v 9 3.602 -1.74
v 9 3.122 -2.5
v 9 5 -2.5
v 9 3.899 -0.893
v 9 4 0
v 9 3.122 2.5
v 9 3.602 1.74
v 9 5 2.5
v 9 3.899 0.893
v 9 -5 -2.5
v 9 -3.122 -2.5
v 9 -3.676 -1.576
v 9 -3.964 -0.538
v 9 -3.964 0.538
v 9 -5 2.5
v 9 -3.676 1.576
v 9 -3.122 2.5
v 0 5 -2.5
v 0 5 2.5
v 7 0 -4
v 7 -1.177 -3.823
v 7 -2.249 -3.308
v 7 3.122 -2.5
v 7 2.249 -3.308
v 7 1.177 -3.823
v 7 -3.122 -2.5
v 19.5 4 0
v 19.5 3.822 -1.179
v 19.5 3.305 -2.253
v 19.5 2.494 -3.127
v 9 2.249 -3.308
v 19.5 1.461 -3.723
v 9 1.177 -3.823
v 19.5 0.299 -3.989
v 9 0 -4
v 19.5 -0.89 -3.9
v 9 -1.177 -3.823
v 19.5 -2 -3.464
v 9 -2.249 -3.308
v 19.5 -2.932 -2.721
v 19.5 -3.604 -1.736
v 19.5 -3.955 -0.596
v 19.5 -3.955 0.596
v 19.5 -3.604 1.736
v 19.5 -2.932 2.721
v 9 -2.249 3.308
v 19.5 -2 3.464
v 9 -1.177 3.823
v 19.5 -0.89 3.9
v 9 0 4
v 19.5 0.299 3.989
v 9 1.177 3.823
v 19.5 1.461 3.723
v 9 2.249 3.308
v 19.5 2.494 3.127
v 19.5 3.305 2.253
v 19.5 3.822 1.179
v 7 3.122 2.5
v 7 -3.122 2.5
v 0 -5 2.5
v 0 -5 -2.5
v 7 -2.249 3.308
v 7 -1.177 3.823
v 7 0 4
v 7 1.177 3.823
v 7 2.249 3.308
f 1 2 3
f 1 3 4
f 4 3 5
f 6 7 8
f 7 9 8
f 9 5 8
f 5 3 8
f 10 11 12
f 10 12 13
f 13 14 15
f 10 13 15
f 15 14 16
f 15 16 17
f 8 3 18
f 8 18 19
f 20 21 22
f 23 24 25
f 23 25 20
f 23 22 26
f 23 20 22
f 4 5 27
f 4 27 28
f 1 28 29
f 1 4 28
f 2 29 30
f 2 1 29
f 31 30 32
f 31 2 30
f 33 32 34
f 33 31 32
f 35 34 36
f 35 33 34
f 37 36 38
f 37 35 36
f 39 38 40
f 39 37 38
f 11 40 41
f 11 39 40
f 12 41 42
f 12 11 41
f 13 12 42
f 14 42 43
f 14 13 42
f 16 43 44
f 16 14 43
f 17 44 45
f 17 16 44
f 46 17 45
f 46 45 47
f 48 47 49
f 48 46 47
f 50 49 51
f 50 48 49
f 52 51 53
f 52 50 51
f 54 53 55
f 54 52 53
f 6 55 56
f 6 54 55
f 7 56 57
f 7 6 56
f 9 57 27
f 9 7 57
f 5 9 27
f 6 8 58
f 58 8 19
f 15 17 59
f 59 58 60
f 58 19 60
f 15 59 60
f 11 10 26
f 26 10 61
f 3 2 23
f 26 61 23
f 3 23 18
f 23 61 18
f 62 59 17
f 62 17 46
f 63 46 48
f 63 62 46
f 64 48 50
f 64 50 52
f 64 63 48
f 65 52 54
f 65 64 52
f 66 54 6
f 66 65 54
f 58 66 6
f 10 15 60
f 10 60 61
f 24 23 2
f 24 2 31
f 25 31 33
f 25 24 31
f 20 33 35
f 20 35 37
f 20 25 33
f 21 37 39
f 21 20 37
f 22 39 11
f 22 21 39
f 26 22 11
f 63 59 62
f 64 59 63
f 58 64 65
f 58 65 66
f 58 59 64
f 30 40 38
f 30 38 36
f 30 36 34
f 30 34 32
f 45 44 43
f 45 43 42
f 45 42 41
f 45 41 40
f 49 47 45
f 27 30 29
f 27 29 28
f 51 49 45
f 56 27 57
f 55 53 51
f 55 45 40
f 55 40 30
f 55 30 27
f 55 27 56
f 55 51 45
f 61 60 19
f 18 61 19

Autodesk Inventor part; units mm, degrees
ref_plane "YZ Plane" through (0, 0, 0) normal (1, 0, 0) x (0, 1, 0)
ref_plane "XZ Plane" through (0, 0, 0) normal (0, 1, 0) x (-1, 0, 0)
ref_plane "XY Plane" through (0, 0, 0) normal (0, 0, 1) x (1, 0, 0)
sketch "Boceto2" plane through (0, 0, 0) normal (1, 0, 0) x (0, 1, 0)
  circle A0 centre (0, 0) radius 4
  dimension "d3" = 8
extrude "Extrusión2" add sketch "Boceto2" along normal blind 19.5
sketch "Boceto3" plane through (0, 0, 0) normal (-1, 0, 0) x (0, 0, 1)
  circle A0 centre (0, 0) radius 4 projected
  line L0 (-2.5, -5) -> (-2.5, 5)
  line L1 (-2.5, 5) -> (2.5, 5)
  line L2 (2.5, 5) -> (2.5, -5)
  line L3 (2.5, -5) -> (-2.5, -5)
  line L4 (-2.5, -5) -> (2.5, 5) construction
  line L5 (-2.5, 5) -> (2.5, -5) construction
  point P0 (-3.1225, 2.5)
  point P1 (-3.1225, -2.5)
  dimension "d15" = 10
  dimension "d16" = 5
extrude "Extrusión3" add sketch "Boceto3" against normal blind 9
sketch "Boceto4" plane through (0, 0, 0) normal (-1, 0, 0) x (0, 0, 1)
  line L0 (2.5, 3.1225) -> (2.5, -3.1225)
  line L1 (-2.5, 3.1225) -> (-2.5, -3.1225)
  line L2 (2.5, 5) -> (2.5, 3.1225) projected
  line L3 (-2.5, 3.1225) -> (-2.5, 5) projected
  arc A0 (2.5, -3.1225) -> (2.5, 3.1225) centre (0, 0) ccw
  arc A1 (-2.5, 3.1225) -> (-2.5, -3.1225) centre (0, 0) ccw
sketch "Boceto5" plane through (0, 0, 0) normal (-1, 0, 0) x (0, 0, 1)
  point P0 (0, 0)
extrude "Extrusión4" cut sketch "Boceto4" against normal blind 7
properties part number "Union pie"
